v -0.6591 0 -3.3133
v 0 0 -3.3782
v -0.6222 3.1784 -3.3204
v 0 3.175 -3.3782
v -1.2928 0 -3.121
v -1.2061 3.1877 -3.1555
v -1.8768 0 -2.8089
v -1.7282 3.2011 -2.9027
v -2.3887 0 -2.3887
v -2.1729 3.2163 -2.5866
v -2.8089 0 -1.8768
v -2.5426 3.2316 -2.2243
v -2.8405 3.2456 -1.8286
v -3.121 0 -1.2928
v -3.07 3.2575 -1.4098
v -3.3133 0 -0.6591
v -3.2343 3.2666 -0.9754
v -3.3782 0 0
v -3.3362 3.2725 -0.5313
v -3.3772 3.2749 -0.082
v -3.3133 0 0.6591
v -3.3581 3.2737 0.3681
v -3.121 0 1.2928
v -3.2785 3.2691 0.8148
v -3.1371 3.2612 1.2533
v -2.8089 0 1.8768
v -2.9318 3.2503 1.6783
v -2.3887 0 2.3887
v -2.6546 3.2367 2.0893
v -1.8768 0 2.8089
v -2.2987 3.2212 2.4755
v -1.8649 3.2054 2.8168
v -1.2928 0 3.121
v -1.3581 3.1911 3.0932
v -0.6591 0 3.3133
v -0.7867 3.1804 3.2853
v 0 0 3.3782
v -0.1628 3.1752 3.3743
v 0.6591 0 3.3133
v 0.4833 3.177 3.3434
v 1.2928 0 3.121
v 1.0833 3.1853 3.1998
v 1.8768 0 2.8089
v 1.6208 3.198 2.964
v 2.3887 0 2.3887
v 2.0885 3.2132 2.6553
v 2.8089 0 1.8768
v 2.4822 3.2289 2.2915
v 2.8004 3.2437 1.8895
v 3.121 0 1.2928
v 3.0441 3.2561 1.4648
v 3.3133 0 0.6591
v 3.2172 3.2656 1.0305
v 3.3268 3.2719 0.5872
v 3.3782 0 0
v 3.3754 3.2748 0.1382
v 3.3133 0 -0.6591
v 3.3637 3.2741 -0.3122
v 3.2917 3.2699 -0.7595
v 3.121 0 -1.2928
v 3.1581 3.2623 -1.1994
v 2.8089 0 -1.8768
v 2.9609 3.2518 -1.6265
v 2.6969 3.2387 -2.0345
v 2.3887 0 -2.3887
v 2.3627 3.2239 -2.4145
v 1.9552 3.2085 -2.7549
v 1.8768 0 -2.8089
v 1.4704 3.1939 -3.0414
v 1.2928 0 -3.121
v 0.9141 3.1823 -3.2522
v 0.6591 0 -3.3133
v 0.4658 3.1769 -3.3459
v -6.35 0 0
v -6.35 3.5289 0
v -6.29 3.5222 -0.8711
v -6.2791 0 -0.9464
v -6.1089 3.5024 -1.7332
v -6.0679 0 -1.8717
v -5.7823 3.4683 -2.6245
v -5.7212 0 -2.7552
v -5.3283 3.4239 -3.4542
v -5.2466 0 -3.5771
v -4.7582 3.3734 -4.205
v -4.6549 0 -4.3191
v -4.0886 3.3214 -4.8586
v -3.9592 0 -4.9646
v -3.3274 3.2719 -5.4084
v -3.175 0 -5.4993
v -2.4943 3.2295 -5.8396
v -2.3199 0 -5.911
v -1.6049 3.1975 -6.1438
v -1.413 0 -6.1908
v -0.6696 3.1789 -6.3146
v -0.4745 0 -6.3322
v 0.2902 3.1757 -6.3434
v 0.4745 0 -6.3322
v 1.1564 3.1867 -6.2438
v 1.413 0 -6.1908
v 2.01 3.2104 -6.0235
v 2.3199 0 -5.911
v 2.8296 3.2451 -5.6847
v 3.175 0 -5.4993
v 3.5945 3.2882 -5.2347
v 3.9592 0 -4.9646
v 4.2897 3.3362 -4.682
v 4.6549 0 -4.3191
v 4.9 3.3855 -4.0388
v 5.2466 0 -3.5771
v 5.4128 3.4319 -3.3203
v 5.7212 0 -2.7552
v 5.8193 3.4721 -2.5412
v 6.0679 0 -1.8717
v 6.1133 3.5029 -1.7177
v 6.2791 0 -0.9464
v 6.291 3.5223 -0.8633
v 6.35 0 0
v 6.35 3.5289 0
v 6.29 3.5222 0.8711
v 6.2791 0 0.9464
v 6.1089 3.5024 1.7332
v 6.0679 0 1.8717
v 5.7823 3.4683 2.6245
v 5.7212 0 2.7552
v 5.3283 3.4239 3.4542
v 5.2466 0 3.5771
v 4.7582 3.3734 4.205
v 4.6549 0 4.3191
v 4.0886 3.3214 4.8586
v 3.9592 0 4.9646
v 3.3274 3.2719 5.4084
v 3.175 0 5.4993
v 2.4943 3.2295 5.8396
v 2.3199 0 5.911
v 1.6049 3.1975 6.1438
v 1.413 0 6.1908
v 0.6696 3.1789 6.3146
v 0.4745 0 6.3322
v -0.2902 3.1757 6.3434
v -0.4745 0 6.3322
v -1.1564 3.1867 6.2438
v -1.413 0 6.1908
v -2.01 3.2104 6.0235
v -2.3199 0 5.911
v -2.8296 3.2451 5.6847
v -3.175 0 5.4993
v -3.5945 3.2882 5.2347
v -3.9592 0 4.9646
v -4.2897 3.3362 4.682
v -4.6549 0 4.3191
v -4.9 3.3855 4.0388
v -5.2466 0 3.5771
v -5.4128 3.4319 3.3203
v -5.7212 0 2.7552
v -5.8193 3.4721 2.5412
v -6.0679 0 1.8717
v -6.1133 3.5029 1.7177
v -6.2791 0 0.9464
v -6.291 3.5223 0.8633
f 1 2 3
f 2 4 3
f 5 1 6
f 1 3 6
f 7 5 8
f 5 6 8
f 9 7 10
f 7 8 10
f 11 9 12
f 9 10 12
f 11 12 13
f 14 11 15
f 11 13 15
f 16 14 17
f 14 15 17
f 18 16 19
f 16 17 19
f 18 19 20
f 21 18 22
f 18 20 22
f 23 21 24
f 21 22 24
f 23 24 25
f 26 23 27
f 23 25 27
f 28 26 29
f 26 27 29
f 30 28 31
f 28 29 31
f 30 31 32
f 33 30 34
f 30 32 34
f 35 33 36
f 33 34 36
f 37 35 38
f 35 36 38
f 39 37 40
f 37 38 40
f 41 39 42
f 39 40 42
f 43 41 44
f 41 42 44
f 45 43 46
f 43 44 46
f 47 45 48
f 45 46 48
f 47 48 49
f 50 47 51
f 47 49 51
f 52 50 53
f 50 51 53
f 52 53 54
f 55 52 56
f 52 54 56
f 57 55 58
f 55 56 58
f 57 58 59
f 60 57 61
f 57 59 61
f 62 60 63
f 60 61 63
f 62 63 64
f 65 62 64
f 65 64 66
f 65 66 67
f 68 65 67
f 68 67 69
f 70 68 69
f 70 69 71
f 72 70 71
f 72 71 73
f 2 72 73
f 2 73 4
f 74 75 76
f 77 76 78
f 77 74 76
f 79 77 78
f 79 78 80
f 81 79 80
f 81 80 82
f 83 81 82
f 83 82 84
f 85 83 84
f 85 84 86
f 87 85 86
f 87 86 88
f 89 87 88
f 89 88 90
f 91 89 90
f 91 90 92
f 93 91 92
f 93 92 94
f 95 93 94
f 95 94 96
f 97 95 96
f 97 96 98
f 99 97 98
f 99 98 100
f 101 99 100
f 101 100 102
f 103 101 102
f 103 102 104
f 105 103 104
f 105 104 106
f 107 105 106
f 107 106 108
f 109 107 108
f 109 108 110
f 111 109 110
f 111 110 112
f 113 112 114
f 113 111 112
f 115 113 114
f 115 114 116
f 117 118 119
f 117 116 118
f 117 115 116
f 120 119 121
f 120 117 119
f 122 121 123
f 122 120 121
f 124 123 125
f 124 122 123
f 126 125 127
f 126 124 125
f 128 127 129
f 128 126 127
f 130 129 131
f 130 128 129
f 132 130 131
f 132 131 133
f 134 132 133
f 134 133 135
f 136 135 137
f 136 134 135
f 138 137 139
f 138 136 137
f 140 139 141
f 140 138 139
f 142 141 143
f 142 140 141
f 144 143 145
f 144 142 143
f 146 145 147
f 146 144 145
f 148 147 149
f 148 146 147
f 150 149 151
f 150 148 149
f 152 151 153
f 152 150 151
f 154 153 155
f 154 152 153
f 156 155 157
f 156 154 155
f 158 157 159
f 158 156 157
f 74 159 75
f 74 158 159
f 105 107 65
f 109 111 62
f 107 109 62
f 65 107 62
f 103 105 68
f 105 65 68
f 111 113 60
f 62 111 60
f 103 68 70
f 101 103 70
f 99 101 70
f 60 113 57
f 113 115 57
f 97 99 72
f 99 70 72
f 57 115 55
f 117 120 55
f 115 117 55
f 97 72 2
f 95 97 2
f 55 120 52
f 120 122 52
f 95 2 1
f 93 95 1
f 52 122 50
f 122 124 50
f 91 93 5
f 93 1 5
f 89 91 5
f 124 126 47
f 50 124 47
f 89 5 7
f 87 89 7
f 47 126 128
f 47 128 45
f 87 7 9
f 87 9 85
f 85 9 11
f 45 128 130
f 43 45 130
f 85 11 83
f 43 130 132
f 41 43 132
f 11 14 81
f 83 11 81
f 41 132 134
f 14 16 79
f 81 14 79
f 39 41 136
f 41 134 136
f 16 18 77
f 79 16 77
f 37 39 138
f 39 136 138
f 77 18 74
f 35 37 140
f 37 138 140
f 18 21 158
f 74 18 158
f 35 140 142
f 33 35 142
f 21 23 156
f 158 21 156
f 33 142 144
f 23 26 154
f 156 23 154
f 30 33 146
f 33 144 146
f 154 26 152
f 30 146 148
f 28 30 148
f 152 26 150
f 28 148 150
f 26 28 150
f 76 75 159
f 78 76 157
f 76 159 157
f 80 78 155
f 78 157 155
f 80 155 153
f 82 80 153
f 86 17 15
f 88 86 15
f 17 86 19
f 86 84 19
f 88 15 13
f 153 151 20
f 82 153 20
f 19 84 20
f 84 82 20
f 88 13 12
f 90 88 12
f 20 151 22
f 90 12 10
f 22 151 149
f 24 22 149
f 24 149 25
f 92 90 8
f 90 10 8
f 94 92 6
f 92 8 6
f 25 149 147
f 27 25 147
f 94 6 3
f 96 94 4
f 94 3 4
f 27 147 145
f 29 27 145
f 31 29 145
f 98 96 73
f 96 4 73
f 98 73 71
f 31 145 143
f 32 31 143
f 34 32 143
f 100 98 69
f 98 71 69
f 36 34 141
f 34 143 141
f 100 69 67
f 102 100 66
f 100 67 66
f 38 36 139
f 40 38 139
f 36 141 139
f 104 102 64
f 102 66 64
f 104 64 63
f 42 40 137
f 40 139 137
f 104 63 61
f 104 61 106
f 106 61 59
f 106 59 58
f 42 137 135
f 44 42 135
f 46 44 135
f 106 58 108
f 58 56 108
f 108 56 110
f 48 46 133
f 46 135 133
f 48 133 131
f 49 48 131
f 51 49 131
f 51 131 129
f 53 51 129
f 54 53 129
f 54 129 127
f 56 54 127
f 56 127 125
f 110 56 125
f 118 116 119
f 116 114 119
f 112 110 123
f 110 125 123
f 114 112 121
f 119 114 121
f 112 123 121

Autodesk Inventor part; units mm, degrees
ref_plane "YZ Plane" through (0, 0, 0) normal (1, 0, 0) x (0, 1, 0)
ref_plane "XZ Plane" through (0, 0, 0) normal (0, 1, 0) x (-1, 0, 0)
ref_plane "XY Plane" through (0, 0, 0) normal (0, 0, 1) x (1, 0, 0)
sketch "Sketch1" plane through (0, 0, 0) normal (0, 1, 0) x (-1, 0, 0)
  circle A0 centre (0, 0) radius 6.35
  dimension "d0" = 12.7
extrude "Extrusion1" add sketch "Sketch1" along normal blind 12.7
sketch "Sketch2" plane through (0, 0, 0) normal (0, 0, 1) x (1, 0, 0)
  circle A0 centre (0, 60.325) radius 57.15
  line L0 (-41.9347, 3.175) -> (51.5907, 3.175) construction
  point P0 (0, 0)
  dimension "d3" = 114.3
  dimension "d4" = 3.175
extrude "Extrusion2" cut sketch "Sketch2" along normal through all both and the other way through all
sketch "Sketch4" plane through (0, 0, 0) normal (0, -1, 0) x (1, 0, 0)
  point P0 (0, 0)
  point P1 (0, 0)
hole "Hole1" at (0, 0, 0) direction (0, 1, 0) diameter 6.7564 end through all clearance for "Socket Head Cap Screw" size "1/4" standard "Ansi Unified Screw Threads"
properties part number "Spacers" material "Aluminum 6061"
